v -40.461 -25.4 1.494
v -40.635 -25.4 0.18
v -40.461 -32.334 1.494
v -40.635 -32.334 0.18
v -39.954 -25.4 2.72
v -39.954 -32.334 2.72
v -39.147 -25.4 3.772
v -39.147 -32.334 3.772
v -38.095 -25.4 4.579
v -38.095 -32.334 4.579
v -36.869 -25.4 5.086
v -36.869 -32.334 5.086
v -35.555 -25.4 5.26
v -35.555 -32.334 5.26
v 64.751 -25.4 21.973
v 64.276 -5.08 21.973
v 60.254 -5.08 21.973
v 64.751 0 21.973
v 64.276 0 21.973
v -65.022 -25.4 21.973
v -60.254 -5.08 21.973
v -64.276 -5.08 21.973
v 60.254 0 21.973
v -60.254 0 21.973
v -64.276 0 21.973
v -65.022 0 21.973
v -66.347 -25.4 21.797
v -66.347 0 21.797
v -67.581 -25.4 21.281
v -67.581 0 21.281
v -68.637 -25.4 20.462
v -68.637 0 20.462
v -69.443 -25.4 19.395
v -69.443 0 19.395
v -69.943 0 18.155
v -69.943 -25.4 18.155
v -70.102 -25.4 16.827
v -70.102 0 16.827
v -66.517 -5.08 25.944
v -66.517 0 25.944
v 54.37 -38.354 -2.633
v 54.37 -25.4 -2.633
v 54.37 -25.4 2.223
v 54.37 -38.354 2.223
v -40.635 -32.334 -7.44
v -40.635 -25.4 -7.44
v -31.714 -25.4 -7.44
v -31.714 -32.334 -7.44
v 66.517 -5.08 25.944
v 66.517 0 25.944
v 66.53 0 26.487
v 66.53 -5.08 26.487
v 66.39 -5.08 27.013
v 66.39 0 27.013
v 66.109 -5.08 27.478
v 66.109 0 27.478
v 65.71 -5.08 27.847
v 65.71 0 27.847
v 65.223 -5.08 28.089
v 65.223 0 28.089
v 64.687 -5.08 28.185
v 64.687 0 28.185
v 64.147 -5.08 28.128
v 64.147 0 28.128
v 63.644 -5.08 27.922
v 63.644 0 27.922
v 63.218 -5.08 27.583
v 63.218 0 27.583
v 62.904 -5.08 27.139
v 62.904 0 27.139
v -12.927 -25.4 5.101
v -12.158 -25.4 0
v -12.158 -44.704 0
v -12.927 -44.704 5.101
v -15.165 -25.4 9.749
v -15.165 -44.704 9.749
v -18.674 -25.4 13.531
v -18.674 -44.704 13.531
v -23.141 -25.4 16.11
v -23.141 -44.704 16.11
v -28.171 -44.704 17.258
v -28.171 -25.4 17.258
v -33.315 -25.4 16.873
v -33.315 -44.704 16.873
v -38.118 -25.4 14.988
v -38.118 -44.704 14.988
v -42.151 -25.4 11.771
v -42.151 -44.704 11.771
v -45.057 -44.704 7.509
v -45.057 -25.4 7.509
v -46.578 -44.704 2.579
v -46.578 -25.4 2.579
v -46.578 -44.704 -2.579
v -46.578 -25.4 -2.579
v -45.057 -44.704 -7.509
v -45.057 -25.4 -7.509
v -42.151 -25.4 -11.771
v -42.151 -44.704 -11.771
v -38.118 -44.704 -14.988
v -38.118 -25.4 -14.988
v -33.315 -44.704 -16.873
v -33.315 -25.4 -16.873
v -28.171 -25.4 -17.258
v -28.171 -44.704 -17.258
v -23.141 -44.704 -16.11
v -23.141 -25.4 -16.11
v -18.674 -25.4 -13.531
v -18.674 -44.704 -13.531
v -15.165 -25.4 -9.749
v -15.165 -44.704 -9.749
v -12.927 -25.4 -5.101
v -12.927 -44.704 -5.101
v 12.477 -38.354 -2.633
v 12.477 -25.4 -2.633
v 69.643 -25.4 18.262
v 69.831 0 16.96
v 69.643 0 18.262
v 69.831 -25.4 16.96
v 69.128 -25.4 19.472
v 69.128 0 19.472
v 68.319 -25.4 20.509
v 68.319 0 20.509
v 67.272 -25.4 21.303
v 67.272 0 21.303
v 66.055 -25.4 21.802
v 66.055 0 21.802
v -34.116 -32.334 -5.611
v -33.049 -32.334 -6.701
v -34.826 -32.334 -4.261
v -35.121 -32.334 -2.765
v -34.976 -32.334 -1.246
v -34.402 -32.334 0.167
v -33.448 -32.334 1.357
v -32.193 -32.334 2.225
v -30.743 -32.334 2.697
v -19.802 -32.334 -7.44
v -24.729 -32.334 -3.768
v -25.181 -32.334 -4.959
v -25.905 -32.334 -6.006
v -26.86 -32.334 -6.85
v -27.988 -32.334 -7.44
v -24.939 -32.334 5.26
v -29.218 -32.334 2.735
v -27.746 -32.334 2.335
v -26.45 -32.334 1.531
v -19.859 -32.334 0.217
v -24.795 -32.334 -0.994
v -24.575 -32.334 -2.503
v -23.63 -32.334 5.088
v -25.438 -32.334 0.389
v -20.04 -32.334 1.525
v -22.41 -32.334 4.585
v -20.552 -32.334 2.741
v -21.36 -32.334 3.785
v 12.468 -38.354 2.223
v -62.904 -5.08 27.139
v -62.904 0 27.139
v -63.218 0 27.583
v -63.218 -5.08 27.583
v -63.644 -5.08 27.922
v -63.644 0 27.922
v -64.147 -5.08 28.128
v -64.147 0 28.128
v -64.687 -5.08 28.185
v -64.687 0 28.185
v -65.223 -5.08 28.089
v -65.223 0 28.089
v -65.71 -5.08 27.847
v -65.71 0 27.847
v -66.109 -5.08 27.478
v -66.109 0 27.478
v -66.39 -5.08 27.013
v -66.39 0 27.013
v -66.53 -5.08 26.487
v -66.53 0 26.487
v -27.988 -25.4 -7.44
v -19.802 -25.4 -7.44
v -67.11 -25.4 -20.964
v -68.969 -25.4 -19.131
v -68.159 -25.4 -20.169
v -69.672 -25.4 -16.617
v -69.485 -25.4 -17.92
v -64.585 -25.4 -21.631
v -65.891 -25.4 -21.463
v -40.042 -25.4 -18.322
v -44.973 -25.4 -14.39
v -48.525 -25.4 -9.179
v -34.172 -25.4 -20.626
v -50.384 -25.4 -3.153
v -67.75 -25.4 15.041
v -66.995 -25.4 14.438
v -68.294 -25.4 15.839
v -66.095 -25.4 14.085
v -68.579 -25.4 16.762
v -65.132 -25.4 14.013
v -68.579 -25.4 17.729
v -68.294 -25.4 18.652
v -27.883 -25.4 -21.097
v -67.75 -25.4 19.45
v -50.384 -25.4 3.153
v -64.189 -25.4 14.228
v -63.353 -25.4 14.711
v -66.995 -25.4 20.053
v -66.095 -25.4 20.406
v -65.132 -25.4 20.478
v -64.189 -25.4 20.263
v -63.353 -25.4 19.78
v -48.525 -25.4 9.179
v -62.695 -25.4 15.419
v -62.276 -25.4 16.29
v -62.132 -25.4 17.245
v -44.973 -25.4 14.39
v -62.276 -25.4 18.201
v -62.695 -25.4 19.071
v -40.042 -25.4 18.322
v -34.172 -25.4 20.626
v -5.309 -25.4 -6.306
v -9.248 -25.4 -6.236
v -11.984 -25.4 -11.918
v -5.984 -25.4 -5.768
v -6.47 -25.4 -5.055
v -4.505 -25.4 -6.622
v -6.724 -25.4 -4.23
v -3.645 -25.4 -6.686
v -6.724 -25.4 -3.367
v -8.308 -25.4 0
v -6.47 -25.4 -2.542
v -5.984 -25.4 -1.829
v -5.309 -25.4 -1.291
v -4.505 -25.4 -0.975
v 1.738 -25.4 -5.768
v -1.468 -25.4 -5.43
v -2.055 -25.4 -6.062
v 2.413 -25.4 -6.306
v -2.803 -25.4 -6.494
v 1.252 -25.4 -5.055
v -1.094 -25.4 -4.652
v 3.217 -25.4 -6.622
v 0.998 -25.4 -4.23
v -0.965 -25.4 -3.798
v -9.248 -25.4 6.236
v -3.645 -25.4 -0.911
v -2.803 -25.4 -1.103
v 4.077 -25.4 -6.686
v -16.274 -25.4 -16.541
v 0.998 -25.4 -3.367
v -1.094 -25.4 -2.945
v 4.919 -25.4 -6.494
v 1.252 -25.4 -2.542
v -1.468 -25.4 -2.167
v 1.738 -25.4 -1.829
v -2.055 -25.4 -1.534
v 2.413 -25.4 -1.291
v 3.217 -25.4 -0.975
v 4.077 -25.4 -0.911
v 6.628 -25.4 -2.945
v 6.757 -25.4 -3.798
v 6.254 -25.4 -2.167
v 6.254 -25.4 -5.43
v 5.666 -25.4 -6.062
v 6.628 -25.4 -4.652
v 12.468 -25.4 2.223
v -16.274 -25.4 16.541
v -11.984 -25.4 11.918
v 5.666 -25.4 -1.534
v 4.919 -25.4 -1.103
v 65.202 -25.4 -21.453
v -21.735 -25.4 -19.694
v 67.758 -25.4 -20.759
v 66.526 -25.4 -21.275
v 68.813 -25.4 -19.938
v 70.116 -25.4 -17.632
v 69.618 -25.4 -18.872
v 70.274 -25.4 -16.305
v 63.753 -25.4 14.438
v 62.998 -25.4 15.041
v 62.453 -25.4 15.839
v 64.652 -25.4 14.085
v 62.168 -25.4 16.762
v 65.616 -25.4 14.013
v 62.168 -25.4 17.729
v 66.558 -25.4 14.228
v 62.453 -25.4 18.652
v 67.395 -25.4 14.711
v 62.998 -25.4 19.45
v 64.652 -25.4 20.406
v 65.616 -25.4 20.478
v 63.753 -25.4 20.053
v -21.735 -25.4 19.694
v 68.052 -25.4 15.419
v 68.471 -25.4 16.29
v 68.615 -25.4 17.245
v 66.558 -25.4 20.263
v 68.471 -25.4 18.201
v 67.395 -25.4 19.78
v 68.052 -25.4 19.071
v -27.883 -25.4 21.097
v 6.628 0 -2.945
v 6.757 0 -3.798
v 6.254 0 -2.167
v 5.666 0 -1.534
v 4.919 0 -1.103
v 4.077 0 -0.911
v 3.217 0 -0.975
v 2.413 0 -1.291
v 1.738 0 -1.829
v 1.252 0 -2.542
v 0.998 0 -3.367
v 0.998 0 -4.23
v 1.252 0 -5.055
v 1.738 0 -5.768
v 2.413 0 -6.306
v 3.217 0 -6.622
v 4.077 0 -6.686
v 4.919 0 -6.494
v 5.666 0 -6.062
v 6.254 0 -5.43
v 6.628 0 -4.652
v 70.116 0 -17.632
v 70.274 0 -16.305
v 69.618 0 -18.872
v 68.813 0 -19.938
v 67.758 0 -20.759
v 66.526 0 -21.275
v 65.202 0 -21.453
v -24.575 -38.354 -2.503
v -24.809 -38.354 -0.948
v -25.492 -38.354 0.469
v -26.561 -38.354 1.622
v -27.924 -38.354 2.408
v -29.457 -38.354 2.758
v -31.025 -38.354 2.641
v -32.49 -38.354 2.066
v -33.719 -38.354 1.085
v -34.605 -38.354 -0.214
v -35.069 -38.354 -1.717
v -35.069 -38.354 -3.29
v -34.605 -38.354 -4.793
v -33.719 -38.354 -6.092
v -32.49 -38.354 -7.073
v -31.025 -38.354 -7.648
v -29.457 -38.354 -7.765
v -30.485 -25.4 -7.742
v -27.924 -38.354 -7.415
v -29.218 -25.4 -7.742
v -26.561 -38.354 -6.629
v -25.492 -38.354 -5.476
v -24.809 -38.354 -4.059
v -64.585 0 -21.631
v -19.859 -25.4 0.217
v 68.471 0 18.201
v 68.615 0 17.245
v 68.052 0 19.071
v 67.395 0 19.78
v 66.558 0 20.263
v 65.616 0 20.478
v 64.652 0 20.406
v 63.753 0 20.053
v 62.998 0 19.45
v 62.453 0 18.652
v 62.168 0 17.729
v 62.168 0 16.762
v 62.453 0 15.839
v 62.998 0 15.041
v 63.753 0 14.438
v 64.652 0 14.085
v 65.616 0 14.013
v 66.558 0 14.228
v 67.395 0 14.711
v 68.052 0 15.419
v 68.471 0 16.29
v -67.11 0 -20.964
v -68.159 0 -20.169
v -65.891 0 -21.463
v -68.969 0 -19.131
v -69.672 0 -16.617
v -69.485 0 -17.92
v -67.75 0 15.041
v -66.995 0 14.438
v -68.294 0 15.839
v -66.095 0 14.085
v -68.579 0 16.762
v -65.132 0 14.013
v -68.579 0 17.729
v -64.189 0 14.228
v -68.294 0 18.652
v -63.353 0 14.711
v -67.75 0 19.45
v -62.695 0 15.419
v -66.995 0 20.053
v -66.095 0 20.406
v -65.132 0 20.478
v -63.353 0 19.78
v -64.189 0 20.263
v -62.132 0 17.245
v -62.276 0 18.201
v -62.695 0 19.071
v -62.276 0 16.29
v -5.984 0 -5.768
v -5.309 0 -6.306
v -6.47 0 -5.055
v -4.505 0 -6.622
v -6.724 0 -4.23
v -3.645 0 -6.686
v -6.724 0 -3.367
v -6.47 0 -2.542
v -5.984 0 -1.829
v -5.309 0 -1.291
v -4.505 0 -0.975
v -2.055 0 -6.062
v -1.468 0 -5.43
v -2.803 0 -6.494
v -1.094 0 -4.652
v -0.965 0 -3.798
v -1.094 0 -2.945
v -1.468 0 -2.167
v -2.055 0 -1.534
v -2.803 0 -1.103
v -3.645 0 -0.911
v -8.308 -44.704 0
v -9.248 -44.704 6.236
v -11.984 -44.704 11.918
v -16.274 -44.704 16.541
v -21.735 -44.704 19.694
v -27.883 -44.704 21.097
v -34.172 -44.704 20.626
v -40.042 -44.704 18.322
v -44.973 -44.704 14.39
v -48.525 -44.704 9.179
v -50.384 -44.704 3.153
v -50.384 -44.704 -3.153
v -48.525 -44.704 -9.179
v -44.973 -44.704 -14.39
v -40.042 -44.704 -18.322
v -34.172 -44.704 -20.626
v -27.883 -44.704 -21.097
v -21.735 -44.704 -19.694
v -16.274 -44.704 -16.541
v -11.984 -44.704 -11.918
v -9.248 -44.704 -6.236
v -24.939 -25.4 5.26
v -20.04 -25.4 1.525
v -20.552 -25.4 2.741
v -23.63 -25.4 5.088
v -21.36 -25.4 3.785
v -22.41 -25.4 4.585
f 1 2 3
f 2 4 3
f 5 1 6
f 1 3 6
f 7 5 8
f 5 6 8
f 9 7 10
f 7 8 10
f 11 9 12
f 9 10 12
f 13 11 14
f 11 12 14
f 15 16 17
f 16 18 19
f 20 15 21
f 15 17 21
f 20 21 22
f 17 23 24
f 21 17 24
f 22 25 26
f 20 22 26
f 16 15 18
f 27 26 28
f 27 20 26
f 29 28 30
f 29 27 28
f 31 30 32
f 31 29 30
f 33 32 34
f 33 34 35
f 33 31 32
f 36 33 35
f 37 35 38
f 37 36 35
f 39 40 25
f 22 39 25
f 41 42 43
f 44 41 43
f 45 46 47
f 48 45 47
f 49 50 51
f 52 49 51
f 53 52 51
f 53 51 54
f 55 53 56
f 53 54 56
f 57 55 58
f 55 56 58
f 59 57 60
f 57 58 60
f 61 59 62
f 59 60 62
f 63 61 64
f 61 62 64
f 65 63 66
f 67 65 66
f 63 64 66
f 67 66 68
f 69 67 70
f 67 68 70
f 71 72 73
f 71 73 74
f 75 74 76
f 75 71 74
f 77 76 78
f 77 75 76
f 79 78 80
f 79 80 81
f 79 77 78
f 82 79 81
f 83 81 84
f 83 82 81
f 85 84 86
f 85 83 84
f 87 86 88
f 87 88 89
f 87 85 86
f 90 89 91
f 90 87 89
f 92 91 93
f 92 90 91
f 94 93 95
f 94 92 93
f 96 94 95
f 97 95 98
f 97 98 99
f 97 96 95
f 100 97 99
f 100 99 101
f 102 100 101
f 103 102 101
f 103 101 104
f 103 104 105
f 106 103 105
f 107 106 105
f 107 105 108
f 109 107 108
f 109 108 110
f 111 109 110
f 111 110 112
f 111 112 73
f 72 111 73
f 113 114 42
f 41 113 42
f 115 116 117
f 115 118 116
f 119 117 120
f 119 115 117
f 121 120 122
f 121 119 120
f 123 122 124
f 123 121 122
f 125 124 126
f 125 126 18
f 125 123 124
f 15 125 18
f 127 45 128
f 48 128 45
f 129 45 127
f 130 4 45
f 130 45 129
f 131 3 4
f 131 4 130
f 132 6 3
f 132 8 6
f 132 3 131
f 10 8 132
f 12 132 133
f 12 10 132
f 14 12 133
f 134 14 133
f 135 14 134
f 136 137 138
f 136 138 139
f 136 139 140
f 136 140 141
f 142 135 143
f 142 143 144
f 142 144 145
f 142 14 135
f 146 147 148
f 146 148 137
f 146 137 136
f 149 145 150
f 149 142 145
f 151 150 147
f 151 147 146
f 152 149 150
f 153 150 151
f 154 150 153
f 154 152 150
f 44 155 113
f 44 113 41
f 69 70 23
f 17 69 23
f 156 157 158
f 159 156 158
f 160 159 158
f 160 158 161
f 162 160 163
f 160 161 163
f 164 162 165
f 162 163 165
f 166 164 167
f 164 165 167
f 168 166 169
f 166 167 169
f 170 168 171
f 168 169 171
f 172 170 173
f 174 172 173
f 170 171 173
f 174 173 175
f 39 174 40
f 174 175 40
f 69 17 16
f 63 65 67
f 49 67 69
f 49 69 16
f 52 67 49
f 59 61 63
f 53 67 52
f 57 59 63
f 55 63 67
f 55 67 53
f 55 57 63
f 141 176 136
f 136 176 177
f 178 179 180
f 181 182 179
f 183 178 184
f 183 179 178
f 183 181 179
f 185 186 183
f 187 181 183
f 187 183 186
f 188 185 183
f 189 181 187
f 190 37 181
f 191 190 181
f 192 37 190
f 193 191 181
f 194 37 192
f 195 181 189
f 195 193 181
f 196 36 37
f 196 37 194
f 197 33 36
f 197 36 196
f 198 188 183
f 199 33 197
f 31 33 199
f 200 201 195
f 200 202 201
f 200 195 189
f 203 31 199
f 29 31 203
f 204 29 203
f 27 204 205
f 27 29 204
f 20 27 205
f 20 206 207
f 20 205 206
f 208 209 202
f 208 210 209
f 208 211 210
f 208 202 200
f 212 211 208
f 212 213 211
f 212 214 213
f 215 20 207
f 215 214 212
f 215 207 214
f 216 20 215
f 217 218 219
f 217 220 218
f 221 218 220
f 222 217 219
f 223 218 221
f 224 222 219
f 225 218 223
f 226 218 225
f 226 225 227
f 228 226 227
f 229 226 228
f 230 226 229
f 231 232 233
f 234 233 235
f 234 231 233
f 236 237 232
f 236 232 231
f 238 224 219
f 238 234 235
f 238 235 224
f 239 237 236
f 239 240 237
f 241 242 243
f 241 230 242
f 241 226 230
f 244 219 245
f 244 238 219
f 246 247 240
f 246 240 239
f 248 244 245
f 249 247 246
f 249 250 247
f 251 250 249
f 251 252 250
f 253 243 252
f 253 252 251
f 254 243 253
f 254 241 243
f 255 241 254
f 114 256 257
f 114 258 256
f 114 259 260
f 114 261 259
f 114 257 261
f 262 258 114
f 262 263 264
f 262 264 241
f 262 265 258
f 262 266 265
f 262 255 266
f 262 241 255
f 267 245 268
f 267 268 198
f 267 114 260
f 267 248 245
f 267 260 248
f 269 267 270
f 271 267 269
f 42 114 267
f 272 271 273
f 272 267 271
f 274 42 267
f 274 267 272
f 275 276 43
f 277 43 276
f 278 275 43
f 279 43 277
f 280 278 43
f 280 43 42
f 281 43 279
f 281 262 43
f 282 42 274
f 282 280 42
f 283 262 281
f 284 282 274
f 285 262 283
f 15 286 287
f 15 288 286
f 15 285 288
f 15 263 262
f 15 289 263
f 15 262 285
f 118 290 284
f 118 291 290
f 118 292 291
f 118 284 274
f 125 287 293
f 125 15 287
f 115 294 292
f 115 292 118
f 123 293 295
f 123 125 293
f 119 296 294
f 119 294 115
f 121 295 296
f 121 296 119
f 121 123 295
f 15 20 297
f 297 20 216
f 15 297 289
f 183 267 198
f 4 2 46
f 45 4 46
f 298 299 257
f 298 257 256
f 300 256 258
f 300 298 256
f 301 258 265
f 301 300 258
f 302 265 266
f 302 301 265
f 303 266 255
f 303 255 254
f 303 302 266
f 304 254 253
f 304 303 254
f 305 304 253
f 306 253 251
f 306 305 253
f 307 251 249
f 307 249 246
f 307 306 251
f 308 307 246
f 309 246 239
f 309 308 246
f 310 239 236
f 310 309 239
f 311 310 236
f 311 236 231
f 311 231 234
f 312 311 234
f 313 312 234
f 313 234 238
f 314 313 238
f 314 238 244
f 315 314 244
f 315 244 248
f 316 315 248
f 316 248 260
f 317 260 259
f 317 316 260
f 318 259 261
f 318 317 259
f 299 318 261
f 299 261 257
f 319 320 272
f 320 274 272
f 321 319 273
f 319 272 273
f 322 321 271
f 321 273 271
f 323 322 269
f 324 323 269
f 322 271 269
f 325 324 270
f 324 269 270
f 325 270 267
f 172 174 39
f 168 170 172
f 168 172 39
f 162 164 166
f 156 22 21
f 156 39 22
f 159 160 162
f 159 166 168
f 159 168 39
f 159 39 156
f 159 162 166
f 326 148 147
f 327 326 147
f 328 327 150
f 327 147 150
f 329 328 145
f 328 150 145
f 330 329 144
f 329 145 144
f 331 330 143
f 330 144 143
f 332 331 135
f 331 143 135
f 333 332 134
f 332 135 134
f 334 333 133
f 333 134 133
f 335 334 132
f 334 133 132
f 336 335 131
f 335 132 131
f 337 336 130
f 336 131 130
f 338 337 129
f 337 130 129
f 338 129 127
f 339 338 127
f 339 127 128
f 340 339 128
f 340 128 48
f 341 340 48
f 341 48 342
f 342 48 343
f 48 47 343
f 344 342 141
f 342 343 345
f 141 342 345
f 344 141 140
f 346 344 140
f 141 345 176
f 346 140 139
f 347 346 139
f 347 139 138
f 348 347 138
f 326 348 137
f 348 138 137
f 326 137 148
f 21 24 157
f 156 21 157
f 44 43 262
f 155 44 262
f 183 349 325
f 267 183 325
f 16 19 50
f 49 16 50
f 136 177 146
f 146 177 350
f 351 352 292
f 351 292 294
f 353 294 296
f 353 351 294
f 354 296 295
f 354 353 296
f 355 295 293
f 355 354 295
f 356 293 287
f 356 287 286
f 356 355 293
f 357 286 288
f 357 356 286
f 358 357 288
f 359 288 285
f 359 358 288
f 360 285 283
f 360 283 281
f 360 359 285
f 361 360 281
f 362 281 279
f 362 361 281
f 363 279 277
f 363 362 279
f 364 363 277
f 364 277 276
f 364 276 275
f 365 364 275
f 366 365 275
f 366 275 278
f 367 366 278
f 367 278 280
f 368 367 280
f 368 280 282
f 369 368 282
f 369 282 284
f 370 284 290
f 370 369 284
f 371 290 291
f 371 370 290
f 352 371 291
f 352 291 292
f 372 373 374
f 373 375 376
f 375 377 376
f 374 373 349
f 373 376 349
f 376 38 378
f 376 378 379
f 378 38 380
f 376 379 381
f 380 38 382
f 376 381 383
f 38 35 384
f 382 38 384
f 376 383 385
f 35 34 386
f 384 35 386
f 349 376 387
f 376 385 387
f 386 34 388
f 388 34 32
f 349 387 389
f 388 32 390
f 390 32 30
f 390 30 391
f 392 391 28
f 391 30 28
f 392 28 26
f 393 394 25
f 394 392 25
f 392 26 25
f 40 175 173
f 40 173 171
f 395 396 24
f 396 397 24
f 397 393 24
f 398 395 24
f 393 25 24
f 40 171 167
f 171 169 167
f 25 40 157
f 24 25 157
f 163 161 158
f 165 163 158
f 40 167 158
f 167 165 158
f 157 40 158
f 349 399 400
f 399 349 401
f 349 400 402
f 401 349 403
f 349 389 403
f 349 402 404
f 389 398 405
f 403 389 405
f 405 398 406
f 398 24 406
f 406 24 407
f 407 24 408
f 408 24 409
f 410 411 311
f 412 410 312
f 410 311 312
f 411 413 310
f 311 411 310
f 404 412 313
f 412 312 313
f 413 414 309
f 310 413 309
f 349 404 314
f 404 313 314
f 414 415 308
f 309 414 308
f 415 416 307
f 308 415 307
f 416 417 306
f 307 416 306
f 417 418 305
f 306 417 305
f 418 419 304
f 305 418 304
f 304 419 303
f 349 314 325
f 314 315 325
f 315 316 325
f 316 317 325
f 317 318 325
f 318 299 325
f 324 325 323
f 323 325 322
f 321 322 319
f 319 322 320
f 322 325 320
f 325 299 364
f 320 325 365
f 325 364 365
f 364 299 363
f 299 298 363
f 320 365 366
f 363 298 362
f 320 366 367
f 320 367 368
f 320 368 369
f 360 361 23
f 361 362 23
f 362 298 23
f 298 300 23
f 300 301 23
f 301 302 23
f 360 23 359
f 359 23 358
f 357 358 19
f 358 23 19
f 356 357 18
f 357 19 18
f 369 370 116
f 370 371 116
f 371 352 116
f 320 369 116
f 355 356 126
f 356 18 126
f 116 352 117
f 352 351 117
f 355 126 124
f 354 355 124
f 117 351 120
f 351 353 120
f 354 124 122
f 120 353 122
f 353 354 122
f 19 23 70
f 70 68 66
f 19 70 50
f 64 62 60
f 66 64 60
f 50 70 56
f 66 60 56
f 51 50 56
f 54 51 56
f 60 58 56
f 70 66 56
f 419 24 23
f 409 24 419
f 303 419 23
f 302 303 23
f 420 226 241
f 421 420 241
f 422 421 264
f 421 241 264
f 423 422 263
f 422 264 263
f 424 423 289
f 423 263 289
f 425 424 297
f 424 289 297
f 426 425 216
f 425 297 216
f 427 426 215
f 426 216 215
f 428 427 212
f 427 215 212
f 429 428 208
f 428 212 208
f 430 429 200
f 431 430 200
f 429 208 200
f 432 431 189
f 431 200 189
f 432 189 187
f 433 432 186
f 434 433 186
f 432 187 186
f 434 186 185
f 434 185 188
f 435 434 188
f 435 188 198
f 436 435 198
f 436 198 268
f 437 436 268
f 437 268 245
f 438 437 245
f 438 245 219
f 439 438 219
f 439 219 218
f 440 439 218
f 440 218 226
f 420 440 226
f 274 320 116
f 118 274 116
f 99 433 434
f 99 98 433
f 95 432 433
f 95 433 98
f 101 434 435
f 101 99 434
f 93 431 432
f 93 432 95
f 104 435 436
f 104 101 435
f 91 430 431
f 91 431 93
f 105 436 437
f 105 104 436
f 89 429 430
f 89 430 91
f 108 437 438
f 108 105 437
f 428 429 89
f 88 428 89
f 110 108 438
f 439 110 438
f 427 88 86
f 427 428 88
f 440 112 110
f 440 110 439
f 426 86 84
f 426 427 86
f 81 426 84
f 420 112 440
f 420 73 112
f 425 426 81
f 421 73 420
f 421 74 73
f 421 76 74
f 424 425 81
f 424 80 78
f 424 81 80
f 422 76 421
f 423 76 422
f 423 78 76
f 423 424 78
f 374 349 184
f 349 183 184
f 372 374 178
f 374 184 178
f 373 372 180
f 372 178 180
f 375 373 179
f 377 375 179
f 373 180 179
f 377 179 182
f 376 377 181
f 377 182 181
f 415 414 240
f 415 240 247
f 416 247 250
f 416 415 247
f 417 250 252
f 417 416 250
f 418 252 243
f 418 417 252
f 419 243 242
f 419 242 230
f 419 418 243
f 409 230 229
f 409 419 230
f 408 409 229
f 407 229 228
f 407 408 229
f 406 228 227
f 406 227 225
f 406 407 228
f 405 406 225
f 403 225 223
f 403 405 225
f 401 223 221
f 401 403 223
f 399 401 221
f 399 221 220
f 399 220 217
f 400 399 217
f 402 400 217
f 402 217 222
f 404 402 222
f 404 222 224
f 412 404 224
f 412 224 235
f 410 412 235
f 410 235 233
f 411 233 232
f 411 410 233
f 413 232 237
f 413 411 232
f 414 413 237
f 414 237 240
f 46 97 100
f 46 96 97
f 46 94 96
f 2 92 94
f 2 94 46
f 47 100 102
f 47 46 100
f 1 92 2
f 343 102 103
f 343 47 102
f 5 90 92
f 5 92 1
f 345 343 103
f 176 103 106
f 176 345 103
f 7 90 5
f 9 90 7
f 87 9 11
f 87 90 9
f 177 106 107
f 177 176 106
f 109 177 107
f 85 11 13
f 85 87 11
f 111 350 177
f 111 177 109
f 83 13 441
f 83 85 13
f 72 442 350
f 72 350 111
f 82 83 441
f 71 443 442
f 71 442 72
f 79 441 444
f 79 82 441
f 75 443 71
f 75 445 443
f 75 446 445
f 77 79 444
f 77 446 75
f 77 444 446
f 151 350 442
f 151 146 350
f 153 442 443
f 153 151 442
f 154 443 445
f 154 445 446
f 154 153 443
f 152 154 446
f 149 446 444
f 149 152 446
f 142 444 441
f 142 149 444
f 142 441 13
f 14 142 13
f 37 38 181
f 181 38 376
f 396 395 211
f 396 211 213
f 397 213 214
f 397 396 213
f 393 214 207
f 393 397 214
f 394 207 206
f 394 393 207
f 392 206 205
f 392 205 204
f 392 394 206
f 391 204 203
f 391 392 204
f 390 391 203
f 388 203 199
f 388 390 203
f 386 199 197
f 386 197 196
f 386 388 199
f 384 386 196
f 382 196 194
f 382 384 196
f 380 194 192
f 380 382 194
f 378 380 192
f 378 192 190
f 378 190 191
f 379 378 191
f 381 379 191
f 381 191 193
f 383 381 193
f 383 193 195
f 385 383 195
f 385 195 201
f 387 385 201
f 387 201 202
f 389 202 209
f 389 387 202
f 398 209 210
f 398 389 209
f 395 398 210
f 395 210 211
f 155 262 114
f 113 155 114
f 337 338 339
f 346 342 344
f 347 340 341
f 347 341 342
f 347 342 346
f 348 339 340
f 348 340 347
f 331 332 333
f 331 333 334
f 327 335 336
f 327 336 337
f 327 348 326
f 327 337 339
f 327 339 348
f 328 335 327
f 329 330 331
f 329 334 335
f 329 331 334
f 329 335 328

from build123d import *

# Parameters (mm, degrees)
F0_R      = 2.895724
F0_R_2    = 3.241562
F1_DEPTH  = 25.4
F2_R      = 5.08
F3_DEPTH  = 5.08
F5_DEPTH  = 32.3342
F6_R      = 5.08
F7_R      = 5.276508
F8_DEPTH  = 38.354
F9_R      = 21.156257
F9_R_2    = 17.306623
F10_DEPTH = 44.704
F12_DEPTH = 38.354


with BuildPart() as f1:
    # F0 (on Front) → F1 (new body)
    with BuildSketch(Plane.XZ):
        Polygon((70.342824, -21.445718), (69.763908, 21.972595), (64.276244, 21.972595), (60.254056, 21.972595), (-60.254056, 21.972595), (-64.276244, 21.972595), (-70.167677, 21.972595), (-69.607526, -21.638222), align=None)
        with Locations((-3.860941, -3.798458)):
            Circle(F0_R, mode=Mode.SUBTRACT)
        with Locations((3.860941, -3.798458)):
            Circle(F0_R, mode=Mode.SUBTRACT)
        with Locations((-65.373771, 17.245404)):
            Circle(F0_R_2, mode=Mode.SUBTRACT)
        with Locations((65.373771, 17.245404)):
            Circle(F0_R_2, mode=Mode.SUBTRACT)
    extrude(amount=F1_DEPTH)

    # F2
    f2_edges = [f1.edges().sort_by_distance(p)[0] for p in [
        (69.763908, -12.7, 21.972595),
        (-70.167677, -12.7, 21.972595),
        (-69.607526, -12.7, -21.638222),
        (70.342824, -12.7, -21.445718),
    ]]
    fillet(f2_edges, radius=F2_R)

    # F0 (on Front) → F3 (join)
    with BuildSketch(Plane.XZ):
        with BuildLine():
            Line((-64.276244, 21.972595), (-60.254056, 21.972595))
            Line((-60.254056, 21.972595), (-62.904059, 27.139447))
            ThreePointArc((-62.904059, 27.139447), (-65.222607, 28.088801), (-66.516974, 25.943679))
            Line((-66.516974, 25.943679), (-64.276244, 21.972595))
        make_face()
        with BuildLine():
            Line((60.254056, 21.972595), (64.276244, 21.972595))
            Line((64.276244, 21.972595), (66.516974, 25.943679))
            ThreePointArc((66.516974, 25.943679), (65.222607, 28.088801), (62.904059, 27.139447))
            Line((62.904059, 27.139447), (60.254056, 21.972595))
        make_face()
    extrude(amount=F3_DEPTH)

    # F4 (on Front) → F5 (join)
    with BuildSketch(Plane.XZ):
        Polygon((-19.896746, 5.259533), (-40.63455, 5.259533), (-40.63455, -7.440129), (-19.802189, -7.440129), align=None)
    extrude(amount=F5_DEPTH)

    # F6
    f6_edges = [f1.edges().sort_by_distance(p)[0] for p in [
        (-40.63455, -28.8671, 5.259533),
        (-19.896746, -28.8671, 5.259533),
    ]]
    fillet(f6_edges, radius=F6_R)

    # F7 (on Front) → F8 (join)
    with BuildSketch(Plane.XZ):
        with Locations((-29.851345, -2.50347)):
            Circle(F7_R)
    extrude(amount=F8_DEPTH)

    # F9 (on Front) → F10 (join)
    with BuildSketch(Plane.XZ):
        with Locations((-29.464282, 0)):
            Circle(F9_R)
        with Locations((-29.464282, 0)):
            Circle(F9_R_2, mode=Mode.SUBTRACT)
    extrude(amount=F10_DEPTH)

    # F11 (on Front) → F12 (join)
    with BuildSketch(Plane.XZ):
        Polygon((54.370172, 2.222606), (12.467819, 2.222606), (12.476523, -2.632661), (54.370172, -2.632661), align=None)
    extrude(amount=F12_DEPTH)


solid = f1.part
